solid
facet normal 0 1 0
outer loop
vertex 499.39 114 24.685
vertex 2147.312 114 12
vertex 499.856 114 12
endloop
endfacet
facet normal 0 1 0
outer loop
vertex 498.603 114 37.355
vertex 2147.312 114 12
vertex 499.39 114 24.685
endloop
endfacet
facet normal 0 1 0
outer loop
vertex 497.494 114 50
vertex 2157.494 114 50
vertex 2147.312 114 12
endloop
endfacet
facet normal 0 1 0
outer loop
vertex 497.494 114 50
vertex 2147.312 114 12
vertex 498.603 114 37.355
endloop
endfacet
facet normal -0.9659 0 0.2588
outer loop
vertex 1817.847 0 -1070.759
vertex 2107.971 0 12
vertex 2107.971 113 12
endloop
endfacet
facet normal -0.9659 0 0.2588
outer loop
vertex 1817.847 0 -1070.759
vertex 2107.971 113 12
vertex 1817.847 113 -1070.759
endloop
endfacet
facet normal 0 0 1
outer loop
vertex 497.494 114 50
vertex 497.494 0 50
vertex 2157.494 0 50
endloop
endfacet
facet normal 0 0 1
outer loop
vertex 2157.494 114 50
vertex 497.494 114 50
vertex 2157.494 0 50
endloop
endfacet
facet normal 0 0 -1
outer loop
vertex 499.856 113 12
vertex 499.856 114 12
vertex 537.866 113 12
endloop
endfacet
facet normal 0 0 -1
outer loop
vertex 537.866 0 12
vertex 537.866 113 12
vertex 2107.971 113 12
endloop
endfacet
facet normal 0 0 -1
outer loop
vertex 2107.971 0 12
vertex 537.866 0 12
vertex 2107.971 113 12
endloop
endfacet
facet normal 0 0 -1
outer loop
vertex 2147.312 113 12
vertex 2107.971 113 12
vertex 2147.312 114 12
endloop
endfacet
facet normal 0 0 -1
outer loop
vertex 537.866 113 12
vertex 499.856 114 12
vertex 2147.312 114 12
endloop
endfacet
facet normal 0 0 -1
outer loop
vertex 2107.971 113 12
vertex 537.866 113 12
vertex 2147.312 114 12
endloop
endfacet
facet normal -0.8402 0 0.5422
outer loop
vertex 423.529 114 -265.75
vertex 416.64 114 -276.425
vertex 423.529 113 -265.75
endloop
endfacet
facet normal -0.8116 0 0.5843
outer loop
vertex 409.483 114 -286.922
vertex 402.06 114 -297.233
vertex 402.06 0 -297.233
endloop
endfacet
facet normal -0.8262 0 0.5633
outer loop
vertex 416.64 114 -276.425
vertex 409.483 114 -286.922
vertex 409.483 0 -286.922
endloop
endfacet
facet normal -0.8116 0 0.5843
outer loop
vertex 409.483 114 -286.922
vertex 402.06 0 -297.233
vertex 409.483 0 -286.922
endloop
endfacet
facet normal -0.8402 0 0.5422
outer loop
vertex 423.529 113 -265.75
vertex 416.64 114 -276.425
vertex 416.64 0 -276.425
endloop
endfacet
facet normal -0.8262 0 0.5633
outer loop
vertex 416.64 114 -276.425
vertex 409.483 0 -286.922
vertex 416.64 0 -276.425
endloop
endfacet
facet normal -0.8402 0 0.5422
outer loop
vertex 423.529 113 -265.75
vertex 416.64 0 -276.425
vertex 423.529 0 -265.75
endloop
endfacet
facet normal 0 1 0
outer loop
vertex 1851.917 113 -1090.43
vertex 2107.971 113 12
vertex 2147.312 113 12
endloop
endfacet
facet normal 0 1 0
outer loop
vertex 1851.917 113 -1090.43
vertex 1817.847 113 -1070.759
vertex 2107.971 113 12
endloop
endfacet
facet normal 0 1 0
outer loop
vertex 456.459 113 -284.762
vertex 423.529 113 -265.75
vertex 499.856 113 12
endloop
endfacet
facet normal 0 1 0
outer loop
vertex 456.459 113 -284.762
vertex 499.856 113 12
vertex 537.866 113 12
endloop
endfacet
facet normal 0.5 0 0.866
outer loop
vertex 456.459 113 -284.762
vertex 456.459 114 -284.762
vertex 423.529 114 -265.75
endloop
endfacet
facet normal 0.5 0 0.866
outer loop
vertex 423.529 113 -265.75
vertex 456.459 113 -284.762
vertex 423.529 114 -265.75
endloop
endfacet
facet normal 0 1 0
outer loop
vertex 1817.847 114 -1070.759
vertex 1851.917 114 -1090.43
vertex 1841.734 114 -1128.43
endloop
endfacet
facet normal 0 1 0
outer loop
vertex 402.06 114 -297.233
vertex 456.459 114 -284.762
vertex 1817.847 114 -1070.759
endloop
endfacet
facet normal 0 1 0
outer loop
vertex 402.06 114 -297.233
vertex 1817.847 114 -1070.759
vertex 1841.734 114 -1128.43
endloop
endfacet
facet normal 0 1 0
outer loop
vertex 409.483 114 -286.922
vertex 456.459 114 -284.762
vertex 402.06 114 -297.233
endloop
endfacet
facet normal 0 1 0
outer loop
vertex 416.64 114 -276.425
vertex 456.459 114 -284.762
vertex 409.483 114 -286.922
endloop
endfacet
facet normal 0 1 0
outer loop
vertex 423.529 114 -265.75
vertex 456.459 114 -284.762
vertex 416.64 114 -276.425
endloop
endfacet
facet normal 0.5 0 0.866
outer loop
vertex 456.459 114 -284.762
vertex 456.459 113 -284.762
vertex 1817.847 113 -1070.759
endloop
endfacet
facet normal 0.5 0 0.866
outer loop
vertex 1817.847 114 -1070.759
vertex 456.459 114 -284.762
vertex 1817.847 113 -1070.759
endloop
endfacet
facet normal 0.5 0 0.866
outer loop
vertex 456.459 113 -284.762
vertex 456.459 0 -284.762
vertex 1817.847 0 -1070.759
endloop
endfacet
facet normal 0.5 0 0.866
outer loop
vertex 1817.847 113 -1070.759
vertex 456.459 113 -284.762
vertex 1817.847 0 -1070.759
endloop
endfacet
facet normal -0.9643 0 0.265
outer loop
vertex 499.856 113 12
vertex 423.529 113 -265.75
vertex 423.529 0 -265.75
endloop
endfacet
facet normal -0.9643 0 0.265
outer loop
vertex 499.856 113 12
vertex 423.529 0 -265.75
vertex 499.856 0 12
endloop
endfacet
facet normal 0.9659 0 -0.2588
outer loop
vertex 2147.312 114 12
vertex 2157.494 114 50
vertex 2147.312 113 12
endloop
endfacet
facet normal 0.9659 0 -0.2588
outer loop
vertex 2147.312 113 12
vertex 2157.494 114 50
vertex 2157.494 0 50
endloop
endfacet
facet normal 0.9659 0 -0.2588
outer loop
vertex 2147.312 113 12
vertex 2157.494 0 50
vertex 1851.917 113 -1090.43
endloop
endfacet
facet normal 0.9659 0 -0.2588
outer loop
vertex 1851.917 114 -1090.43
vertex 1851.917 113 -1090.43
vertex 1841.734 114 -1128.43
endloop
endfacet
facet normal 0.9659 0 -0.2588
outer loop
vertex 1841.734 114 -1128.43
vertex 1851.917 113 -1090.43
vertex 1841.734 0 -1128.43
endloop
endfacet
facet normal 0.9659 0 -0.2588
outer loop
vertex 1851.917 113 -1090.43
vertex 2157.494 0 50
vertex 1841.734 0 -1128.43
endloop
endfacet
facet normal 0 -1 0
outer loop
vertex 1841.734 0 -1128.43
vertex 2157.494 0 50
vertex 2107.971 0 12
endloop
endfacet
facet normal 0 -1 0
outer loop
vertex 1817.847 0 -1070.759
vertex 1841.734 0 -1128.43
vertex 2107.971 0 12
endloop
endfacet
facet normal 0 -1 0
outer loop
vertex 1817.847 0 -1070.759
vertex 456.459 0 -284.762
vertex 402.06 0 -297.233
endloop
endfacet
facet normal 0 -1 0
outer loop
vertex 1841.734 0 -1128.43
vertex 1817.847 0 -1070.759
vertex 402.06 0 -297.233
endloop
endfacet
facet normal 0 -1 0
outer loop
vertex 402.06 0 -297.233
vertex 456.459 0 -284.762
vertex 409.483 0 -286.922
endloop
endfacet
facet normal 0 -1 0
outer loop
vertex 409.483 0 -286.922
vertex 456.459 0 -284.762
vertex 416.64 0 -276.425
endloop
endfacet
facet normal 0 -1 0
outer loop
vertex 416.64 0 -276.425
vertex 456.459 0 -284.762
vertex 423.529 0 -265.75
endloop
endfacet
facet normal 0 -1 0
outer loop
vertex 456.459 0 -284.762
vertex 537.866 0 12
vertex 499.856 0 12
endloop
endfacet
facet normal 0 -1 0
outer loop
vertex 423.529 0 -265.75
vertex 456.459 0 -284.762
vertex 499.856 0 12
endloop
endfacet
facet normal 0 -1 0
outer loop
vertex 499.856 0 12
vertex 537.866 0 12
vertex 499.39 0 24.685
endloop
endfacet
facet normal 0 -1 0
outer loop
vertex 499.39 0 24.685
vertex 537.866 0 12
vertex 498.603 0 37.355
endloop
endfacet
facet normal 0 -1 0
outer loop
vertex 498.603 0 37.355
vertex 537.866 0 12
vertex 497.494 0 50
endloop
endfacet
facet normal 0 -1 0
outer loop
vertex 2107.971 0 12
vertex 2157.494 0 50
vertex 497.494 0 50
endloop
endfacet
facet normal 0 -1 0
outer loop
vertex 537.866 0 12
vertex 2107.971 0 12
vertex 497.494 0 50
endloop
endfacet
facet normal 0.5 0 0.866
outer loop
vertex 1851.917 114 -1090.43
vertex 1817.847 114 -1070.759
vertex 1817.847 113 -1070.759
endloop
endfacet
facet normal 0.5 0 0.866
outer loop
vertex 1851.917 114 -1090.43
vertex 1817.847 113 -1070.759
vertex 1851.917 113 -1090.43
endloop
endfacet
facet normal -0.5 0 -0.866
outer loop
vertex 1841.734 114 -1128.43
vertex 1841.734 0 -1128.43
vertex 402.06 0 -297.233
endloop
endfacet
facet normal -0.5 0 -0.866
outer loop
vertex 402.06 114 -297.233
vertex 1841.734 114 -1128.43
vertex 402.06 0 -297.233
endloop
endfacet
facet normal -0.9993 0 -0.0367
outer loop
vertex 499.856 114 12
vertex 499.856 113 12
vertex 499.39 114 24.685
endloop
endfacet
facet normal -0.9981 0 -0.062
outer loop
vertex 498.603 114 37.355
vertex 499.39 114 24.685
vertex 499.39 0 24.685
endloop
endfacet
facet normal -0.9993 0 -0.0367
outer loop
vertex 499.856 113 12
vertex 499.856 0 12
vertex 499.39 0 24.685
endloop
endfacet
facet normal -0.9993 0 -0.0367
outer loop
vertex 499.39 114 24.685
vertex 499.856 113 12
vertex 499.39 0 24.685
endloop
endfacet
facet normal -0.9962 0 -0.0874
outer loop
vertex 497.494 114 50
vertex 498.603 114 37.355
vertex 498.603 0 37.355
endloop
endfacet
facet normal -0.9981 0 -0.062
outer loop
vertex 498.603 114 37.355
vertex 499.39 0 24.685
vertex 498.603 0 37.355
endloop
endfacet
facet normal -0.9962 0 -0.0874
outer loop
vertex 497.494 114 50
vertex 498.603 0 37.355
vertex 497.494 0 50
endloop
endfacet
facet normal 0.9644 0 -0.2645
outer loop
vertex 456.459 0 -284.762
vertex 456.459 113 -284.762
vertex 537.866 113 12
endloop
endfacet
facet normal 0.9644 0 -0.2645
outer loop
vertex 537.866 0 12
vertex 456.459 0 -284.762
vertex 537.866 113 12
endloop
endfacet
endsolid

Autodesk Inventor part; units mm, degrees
ref_plane "YZ Plane" through (0, 0, 0) normal (1, 0, 0) x (0, 1, 0)
ref_plane "XZ Plane" through (0, 0, 0) normal (0, 1, 0) x (-1, 0, 0)
ref_plane "XY Plane" through (0, 0, 0) normal (0, 0, 1) x (1, 0, 0)
sketch "Sketch1" plane through (0, 0, 0) normal (0, 1, 0) x (-1, 0, 0)
  line L0 (0, 0) -> (-3000, 0) construction
  line L1 (0, 0) -> (-2598.0762, -1500) construction
  line L2 (0, 0) -> (3000, 0) construction
  arc A0 (-497.4937, 50) -> (-402.0602, -297.2332) centre (0, 0) ccw
  line L3 (-497.4937, 50) -> (-2157.4937, 50)
  line L4 (-2157.4937, 50) -> (-1841.7345, -1128.4295)
  line L5 (-2157.4937, 50) -> (-937.4937, 50) construction
  line L6 (-1841.7345, -1128.4295) -> (1158.2655, -1128.4295) construction
  line L7 (-1841.7345, -1128.4295) -> (-402.0602, -297.2332)
  arc A1 (-537.8662, 12) -> (-456.459, -284.7617) centre (0, 0) ccw
  line L8 (-2107.9712, 12) -> (-537.8662, 12)
  line L9 (-456.459, -284.7617) -> (-1817.8467, -1070.7593)
  line L10 (-2107.9712, 12) -> (-1817.8467, -1070.7593)
  dimension "d1" = 3000
  dimension "d2" = 150
  dimension "d3" = 1000
  dimension "d11" = 50
  dimension "d12" = 1660
  dimension "d13" = 1220
  dimension "d14" = 75
extrude "Extrusion2" add sketch "Sketch1" along normal blind 114
sketch "Sketch2" plane through (0, 114, 0) normal (0, 1, 0) x (1, 0, 0)
  line L0 (497.4937, -50) -> (2157.4937, -50) projected
  line L1 (1841.7345, 1128.4295) -> (402.0602, 297.2332) projected
  arc A0 (497.4937, -50) -> (402.0602, 297.2332) centre (0, 0) ccw projected
  line L2 (456.459, 284.7617) -> (537.8662, -12)
  line L3 (456.459, 284.7617) -> (423.5293, 265.7497)
  line L4 (537.8662, -12) -> (499.856, -12)
  line L5 (423.5293, 265.7497) -> (499.856, -12)
extrude "Extrusion3" add sketch "Sketch2" against normal blind 114 contours L5 A0
sketch "Sketch3" plane through (0, 114, 0) normal (0, 1, 0) x (1, 0, 0)
  arc A0 (537.8662, -12) -> (456.459, 284.7617) centre (0, 0) ccw projected
  line L0 (456.459, 284.7617) -> (537.8662, -12)
extrude "Extrusion4" cut sketch "Sketch3" against normal blind 3500
sketch "Sketch4" plane through (0, 114, 0) normal (0, 1, 0) x (1, 0, 0)
  line L0 (537.8662, -12) -> (456.459, 284.7617) projected
  line L1 (2107.9712, -12) -> (537.8662, -12) projected
  line L2 (1841.7345, 1128.4295) -> (402.0602, 297.2332) projected
  line L3 (423.5293, 265.7497) -> (499.856, -12) projected
  line L4 (456.459, 284.7617) -> (423.5293, 265.7497)
  line L5 (499.856, -12) -> (537.8662, -12)
extrude "Extrusion5" cut sketch "Sketch4" against normal blind 1
sketch "Sketch5" plane through (0, 114, 0) normal (0, 1, 0) x (1, 0, 0)
  line L0 (1817.8467, 1070.7593) -> (2107.9712, -12) projected
  line L1 (497.4937, -50) -> (2157.4937, -50) projected
  line L2 (2157.4937, -50) -> (1841.7345, 1128.4295) projected
  line L3 (1841.7345, 1128.4295) -> (402.0602, 297.2332) projected
  line L4 (1817.8467, 1070.7593) -> (1851.9166, 1090.4295)
  line L5 (2107.9712, -12) -> (2147.3116, -12)
extrude "Extrusion6" cut sketch "Sketch5" against normal blind 1
properties part number "panelAflat" material "Wood (Birch)"
